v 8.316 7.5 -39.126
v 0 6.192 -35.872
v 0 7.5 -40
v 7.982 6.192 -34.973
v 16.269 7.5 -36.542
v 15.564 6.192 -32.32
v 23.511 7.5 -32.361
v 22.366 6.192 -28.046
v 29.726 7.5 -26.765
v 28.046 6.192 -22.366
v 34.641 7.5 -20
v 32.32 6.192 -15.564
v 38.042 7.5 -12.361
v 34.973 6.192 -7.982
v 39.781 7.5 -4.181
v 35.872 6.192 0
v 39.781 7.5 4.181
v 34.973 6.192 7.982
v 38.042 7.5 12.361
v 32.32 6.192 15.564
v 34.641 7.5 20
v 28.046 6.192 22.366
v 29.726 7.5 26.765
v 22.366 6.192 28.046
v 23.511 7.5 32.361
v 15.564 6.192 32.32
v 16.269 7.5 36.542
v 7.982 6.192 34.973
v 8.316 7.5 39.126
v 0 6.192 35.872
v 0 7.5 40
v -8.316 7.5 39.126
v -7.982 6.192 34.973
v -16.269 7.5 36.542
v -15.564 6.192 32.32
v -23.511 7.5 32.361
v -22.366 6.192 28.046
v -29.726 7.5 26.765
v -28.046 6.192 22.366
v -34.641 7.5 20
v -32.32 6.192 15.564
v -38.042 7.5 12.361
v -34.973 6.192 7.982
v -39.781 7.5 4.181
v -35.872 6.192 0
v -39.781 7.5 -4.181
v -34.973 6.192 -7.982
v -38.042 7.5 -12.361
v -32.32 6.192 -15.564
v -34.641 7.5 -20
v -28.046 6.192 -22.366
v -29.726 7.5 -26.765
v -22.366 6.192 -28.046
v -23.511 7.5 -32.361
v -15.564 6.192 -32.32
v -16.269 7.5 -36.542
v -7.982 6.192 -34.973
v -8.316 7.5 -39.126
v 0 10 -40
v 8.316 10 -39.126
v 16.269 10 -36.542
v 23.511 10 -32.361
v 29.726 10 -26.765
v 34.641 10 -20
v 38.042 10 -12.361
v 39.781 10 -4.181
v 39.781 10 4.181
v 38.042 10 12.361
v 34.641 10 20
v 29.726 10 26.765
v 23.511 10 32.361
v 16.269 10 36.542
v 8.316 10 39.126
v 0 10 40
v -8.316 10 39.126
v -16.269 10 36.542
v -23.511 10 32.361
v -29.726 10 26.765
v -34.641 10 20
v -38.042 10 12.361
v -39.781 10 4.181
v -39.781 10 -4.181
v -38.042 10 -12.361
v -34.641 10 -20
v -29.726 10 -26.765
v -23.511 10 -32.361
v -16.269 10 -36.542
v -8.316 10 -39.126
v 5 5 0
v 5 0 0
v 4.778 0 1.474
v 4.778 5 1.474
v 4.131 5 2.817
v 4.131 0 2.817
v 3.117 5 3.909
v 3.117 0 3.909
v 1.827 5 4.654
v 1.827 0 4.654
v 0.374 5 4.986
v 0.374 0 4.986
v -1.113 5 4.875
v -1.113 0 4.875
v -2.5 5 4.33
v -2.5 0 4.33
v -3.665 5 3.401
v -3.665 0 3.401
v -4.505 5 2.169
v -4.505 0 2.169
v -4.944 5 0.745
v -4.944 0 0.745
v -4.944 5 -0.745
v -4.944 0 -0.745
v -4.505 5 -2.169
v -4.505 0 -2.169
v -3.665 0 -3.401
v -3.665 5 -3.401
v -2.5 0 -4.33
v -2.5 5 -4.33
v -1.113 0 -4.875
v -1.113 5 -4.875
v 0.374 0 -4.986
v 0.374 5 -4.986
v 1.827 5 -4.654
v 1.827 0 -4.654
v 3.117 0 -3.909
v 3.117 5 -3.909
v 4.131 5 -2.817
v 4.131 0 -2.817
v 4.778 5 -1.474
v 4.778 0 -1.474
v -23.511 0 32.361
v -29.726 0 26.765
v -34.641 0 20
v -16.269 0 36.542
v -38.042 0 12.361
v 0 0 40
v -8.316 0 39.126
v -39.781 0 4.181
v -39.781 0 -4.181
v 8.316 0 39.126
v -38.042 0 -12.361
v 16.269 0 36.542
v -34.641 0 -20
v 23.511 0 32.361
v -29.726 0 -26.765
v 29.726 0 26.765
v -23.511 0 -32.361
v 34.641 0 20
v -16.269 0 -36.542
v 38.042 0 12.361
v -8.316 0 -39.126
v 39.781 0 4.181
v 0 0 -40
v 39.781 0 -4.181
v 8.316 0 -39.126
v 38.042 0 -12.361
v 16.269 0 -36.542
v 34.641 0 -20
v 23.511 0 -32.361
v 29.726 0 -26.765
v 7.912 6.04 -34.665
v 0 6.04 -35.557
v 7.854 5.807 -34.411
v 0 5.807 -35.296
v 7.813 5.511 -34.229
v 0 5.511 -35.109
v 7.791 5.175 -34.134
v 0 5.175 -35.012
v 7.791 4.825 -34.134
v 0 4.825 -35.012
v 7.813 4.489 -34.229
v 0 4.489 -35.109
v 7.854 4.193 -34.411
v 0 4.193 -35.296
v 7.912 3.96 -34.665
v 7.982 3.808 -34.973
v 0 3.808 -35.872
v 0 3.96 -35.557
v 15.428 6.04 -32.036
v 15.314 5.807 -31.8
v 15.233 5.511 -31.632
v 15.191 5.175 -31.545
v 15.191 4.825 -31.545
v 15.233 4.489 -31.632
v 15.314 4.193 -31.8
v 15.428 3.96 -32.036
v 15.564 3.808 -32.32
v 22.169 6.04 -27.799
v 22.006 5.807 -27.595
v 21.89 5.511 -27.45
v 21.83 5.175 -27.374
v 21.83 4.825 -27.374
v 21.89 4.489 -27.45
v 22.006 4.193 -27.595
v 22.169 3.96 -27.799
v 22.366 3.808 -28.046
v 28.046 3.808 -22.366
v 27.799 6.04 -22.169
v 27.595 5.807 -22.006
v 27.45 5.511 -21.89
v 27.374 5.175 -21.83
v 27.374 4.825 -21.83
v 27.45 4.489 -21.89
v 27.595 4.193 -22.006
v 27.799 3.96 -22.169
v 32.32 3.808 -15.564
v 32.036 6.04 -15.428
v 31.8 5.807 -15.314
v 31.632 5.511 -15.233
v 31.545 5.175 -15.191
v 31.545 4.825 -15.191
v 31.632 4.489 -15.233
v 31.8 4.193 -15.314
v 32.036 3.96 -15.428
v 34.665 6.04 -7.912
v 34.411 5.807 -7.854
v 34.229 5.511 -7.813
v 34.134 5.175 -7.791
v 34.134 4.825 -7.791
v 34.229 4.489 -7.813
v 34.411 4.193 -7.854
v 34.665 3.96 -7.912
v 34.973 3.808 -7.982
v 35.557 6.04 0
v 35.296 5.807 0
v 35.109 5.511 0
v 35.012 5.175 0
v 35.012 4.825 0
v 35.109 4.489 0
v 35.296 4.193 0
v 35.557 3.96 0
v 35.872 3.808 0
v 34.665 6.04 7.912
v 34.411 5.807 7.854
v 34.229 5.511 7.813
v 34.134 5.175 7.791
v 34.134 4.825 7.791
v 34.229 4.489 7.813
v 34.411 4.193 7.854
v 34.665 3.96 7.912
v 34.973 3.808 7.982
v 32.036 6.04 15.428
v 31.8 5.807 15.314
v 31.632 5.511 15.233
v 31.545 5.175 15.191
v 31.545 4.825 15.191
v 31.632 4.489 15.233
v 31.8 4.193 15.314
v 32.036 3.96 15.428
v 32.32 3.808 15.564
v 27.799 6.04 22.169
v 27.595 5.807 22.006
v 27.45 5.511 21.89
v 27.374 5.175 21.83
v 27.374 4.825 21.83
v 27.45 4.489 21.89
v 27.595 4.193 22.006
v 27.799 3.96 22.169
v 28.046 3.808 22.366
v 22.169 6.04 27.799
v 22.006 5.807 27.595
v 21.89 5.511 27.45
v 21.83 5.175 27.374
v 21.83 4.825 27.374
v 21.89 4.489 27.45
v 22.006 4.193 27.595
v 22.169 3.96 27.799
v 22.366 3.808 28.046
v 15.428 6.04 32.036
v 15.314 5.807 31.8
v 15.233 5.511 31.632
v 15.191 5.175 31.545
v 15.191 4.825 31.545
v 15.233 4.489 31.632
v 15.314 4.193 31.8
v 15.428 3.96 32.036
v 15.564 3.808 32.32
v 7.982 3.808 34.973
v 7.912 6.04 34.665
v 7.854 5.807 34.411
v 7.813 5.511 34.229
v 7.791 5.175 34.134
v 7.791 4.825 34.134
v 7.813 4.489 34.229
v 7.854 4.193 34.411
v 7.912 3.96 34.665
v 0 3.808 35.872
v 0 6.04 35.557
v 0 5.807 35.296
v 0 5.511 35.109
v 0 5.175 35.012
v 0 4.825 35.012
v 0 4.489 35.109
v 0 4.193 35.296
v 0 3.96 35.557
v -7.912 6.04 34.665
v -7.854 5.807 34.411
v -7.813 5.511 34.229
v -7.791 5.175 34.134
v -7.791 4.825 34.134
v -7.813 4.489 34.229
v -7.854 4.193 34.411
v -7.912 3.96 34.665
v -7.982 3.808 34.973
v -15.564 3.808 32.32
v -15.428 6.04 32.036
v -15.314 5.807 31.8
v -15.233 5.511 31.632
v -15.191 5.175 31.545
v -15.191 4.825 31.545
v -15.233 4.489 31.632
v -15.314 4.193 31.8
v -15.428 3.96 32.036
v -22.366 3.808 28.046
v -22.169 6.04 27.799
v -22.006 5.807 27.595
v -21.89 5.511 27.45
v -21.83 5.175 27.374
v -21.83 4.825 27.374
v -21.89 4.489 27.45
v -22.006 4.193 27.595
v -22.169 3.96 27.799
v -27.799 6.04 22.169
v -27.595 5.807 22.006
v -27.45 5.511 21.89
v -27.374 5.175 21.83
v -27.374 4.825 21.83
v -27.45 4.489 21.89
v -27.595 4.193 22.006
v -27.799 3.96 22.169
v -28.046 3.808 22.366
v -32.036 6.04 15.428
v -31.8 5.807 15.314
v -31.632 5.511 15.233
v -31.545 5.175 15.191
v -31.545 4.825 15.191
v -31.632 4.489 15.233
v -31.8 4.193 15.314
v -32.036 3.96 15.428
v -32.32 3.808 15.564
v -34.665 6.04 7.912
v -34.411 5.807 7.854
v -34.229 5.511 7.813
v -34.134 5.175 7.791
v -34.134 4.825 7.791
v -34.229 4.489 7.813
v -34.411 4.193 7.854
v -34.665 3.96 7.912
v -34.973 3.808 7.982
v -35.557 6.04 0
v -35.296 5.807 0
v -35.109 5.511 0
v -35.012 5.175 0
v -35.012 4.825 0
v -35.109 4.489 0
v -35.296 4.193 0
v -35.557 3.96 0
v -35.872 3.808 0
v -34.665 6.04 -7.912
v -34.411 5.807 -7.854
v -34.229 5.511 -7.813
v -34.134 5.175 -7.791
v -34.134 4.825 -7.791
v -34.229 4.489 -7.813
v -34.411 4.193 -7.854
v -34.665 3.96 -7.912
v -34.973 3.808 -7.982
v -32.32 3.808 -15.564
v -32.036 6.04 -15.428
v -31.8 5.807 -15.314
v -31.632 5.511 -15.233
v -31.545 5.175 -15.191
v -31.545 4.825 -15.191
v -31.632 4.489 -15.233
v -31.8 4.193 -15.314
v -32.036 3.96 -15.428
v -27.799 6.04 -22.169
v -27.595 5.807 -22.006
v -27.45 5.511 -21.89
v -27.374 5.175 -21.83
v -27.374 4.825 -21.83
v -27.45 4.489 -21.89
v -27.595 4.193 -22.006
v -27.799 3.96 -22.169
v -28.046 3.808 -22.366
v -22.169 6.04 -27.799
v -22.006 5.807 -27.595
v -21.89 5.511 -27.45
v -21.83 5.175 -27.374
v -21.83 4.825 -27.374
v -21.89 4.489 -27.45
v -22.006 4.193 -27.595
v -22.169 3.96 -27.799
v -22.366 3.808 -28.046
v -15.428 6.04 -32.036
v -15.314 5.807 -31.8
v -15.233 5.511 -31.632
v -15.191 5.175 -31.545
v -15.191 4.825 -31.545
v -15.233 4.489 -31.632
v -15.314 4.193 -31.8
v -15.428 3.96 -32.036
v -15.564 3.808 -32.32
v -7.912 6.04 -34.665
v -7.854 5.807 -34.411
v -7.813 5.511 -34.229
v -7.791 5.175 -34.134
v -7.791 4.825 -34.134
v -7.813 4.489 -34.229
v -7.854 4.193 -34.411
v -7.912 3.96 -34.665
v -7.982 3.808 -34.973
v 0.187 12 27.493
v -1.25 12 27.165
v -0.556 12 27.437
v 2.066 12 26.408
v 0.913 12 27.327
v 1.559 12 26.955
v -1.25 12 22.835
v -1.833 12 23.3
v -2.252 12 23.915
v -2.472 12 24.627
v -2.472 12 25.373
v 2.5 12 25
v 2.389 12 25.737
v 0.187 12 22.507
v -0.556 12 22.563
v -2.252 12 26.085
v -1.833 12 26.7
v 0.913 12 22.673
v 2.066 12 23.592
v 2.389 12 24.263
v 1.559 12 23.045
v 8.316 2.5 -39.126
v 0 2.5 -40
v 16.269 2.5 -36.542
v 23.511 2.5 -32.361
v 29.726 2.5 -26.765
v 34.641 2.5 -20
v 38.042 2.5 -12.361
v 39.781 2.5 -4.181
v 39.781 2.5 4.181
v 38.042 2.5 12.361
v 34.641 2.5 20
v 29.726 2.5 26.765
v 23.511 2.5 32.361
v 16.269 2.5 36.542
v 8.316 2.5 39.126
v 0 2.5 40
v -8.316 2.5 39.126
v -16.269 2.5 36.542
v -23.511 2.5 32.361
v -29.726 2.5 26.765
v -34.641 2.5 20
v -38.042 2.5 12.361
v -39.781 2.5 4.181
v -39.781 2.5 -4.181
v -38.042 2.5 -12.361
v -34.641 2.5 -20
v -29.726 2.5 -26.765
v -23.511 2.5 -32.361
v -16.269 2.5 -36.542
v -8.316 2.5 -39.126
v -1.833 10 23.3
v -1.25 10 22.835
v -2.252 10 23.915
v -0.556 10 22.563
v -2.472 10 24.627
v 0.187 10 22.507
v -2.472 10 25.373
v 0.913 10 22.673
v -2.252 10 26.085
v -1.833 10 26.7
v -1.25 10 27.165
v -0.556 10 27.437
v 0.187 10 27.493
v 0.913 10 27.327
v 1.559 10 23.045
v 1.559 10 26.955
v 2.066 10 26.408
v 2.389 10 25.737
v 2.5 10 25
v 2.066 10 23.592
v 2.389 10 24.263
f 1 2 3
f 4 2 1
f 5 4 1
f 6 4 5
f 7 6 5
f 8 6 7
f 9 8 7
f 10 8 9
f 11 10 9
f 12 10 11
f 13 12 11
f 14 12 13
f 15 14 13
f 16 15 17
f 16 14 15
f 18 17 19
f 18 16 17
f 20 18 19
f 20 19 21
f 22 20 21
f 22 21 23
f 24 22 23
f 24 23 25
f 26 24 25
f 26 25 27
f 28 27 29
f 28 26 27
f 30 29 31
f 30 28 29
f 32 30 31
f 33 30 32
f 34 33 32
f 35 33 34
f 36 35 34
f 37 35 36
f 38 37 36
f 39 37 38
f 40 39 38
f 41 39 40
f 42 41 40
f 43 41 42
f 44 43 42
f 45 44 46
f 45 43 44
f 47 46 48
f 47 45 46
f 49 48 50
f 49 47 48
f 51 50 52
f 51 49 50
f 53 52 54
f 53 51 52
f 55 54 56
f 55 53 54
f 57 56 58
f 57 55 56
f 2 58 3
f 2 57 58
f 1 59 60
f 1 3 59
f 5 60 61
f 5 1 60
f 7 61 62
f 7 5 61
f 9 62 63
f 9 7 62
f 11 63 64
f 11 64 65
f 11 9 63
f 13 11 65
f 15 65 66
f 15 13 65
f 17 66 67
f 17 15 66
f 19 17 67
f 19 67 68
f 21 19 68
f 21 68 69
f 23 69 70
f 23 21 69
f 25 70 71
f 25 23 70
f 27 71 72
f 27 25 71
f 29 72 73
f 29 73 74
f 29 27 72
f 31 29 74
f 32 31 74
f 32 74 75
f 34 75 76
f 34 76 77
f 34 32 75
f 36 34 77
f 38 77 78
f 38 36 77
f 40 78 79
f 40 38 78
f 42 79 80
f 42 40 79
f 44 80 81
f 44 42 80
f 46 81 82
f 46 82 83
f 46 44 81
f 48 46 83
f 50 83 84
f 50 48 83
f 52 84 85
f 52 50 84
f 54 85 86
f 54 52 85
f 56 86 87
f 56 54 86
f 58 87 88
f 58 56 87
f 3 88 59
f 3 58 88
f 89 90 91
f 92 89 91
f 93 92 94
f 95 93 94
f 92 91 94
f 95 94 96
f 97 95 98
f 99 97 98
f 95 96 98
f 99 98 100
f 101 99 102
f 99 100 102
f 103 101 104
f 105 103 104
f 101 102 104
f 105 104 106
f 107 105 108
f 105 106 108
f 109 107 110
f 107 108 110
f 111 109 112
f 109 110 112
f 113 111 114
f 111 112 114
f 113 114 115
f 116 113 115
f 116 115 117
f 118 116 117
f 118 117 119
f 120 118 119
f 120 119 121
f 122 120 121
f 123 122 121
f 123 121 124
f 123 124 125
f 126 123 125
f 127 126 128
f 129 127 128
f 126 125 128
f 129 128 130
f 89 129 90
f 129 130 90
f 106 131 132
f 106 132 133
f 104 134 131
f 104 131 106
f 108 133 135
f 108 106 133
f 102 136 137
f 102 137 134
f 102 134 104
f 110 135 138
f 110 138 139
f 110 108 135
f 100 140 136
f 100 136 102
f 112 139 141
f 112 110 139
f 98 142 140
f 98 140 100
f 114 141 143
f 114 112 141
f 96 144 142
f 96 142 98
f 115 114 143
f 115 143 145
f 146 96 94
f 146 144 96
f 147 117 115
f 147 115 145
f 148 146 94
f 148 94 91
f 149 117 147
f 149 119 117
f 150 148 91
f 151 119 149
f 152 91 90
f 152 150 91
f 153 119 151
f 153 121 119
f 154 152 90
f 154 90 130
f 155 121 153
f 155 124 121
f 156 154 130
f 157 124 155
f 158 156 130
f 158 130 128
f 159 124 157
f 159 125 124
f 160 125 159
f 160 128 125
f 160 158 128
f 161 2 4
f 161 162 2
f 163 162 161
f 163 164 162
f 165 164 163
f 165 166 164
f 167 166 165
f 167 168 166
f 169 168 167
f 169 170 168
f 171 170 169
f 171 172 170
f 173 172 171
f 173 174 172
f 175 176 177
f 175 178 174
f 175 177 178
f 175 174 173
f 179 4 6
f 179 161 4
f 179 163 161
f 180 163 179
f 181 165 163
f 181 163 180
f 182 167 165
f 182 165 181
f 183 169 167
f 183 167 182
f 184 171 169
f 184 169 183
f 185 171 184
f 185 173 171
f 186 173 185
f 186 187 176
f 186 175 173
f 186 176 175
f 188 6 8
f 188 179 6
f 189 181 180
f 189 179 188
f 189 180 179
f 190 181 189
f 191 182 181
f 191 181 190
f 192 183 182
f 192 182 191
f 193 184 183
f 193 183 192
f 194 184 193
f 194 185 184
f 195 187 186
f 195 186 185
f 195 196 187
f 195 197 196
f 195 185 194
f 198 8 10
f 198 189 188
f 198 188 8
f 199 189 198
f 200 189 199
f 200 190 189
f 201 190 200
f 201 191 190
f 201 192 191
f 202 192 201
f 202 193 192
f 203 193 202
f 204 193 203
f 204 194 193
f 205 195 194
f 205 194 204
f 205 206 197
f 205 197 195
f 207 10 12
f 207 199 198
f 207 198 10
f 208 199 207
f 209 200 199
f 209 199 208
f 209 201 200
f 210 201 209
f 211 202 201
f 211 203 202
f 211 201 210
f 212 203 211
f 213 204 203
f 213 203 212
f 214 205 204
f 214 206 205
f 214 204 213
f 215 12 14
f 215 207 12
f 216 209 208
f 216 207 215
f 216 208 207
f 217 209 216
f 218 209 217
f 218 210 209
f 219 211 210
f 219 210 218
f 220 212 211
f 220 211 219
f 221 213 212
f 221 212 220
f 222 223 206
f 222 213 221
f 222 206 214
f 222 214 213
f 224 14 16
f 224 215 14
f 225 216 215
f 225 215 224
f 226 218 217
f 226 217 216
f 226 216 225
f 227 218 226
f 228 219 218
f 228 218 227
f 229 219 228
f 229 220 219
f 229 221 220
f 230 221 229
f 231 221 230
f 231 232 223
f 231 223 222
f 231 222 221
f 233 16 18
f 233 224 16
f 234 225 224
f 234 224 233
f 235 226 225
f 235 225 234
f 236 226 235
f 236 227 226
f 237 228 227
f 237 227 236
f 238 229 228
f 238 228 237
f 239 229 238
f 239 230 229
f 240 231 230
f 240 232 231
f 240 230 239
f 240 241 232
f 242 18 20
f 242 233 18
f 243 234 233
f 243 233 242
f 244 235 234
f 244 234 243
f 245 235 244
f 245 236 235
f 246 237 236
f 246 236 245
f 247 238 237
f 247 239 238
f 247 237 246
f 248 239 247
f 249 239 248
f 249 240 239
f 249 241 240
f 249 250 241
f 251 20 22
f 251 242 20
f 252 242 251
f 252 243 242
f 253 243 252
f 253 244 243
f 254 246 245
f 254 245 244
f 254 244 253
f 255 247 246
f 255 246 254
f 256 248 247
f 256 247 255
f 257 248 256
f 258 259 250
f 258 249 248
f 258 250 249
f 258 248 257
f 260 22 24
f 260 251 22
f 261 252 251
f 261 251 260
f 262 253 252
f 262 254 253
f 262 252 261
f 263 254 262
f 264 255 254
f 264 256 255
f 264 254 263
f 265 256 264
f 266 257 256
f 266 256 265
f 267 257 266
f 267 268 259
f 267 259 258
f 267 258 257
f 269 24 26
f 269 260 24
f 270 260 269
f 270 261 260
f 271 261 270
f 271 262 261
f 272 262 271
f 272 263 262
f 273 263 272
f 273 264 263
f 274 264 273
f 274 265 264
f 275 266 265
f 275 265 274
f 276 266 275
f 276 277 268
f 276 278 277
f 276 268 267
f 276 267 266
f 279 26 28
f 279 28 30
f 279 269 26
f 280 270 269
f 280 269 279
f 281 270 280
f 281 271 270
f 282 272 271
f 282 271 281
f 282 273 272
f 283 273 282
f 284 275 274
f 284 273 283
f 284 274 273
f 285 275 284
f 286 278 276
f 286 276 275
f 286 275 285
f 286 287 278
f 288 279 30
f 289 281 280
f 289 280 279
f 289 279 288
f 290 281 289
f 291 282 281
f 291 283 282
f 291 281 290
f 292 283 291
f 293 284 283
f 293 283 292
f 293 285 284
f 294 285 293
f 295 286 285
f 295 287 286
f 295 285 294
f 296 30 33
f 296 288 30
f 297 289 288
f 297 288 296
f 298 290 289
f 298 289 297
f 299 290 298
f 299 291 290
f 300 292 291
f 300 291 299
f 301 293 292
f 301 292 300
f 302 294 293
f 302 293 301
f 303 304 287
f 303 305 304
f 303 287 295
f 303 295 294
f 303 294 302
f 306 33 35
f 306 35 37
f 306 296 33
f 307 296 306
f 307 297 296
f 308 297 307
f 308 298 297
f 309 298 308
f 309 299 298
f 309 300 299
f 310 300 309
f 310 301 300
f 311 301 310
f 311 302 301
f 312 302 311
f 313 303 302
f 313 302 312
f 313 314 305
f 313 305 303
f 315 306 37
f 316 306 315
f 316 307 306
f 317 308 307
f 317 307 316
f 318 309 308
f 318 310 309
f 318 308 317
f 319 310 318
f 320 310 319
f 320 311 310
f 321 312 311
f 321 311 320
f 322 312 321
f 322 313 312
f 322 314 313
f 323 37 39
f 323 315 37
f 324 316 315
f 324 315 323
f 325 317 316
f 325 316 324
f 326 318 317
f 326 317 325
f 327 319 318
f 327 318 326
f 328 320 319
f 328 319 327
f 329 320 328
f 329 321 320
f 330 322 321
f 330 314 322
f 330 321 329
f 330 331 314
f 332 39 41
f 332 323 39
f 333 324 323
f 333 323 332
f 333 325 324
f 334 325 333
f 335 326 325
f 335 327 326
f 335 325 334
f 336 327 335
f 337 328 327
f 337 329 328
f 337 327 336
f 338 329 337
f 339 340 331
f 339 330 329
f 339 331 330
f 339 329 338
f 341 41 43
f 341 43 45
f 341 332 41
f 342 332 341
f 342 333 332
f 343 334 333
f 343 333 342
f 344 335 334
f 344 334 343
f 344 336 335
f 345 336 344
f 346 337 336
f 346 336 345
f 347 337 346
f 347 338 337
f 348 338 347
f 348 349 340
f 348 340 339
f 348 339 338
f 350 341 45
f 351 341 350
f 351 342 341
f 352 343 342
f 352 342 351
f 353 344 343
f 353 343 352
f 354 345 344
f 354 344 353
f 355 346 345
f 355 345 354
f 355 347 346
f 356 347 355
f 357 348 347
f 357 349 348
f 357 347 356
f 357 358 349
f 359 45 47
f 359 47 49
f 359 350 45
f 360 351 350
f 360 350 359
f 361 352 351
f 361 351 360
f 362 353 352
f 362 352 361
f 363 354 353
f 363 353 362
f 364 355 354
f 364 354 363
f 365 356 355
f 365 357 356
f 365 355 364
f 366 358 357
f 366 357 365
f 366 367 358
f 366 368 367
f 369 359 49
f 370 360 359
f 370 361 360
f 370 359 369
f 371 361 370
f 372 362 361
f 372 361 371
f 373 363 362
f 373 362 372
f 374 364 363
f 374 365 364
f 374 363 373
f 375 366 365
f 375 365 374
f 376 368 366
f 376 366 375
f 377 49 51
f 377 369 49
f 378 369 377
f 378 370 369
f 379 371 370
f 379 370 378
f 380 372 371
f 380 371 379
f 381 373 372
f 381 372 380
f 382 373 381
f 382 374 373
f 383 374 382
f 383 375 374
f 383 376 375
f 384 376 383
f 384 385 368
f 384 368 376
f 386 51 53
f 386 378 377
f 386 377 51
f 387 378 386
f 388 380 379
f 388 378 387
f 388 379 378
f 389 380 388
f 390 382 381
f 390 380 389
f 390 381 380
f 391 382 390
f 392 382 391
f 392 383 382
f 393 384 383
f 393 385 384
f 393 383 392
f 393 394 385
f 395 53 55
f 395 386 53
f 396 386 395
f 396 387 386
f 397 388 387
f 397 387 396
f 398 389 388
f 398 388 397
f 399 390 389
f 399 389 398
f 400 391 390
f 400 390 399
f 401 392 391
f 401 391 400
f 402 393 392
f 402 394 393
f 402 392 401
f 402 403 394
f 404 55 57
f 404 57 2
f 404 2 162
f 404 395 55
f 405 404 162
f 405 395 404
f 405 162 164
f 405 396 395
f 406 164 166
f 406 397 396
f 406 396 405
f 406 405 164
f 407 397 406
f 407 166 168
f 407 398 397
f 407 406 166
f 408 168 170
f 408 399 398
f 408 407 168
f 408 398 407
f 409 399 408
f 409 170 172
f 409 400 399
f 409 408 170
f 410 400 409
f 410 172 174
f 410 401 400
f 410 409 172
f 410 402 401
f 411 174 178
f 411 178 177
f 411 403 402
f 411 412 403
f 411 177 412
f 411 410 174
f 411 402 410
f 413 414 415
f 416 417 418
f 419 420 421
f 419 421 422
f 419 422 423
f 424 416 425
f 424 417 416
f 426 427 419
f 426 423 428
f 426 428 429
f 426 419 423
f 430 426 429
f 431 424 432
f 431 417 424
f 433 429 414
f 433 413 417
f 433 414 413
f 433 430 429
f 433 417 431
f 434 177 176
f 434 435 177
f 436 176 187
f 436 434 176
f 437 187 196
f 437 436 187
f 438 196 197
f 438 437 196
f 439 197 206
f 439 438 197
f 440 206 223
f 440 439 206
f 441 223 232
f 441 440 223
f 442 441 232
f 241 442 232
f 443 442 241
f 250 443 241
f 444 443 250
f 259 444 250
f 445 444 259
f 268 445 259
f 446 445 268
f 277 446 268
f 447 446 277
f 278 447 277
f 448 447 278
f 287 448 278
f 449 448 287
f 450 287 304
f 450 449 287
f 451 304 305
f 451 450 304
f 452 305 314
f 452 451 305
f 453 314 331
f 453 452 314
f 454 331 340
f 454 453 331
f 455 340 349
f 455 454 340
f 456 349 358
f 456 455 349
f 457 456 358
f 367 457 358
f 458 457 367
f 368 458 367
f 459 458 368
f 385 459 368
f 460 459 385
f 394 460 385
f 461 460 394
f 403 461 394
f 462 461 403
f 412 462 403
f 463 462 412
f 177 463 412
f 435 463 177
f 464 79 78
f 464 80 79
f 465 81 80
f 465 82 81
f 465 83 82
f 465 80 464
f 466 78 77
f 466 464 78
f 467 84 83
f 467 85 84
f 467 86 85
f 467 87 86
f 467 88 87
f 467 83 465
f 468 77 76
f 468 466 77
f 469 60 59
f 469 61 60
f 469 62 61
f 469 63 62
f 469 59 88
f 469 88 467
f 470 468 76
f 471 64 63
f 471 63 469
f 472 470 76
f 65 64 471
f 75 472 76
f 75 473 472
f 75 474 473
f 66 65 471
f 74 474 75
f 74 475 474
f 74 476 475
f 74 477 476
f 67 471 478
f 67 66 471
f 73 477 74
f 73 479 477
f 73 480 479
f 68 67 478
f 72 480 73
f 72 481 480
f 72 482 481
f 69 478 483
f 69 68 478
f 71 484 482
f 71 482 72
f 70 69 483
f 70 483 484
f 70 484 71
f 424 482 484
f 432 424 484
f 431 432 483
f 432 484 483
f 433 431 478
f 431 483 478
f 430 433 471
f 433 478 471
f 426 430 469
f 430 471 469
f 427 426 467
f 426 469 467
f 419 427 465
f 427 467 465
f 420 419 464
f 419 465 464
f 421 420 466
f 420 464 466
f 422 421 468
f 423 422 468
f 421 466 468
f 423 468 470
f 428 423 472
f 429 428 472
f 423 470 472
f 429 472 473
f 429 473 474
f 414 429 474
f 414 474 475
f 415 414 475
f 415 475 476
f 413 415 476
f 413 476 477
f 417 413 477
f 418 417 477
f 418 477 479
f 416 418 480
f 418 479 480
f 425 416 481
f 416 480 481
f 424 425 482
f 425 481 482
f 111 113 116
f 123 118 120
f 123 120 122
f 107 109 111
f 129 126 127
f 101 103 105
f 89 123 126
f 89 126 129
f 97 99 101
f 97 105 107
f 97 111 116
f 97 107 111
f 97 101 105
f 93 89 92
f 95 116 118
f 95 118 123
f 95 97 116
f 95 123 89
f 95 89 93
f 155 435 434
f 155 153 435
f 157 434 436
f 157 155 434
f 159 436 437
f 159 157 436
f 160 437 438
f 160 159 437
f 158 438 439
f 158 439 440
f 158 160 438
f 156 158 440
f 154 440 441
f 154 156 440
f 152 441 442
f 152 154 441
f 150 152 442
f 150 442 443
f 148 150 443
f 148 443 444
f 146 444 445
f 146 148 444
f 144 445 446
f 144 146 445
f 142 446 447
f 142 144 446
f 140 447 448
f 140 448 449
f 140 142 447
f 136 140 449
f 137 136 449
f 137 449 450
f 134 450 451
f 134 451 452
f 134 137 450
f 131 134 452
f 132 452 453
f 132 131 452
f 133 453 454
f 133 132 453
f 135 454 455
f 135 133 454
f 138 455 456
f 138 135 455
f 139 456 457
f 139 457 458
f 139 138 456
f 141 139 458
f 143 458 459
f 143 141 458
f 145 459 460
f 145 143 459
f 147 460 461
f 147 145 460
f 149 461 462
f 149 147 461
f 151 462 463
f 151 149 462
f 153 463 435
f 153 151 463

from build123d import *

# Parameters (mm, degrees)
SKETCH1_R           = 35
BOSS_EXTRUDE1_DEPTH = 10
SKETCH3_R           = 5
CUT_EXTRUDE1_DEPTH  = 5
SKETCH4_R           = 2.5
BOSS_EXTRUDE2_DEPTH = 2


with BuildPart() as part:
    # Sketch1 → Boss-Extrude1 (new body)
    with BuildSketch(Plane(origin=(0, 0, 0), x_dir=(1, 0, 0), z_dir=(0, 1, 0))):
        Circle(SKETCH1_R)
    extrude(amount=BOSS_EXTRUDE1_DEPTH)

    # Sketch2 → Revolve1 (revolve)
    with BuildSketch(Plane(origin=(0, 0, 0), x_dir=(0, 0, -1), z_dir=(1, 0, 0))):
        with BuildLine():
            Line((35, 10), (40, 10))
            Line((40, 10), (40, 7.5))
            Line((40, 7.5), (35.872288151, 6.191567774))
            ThreePointArc((35.872288151, 6.191567774), (35, 5), (35.872288151, 3.808432226))
            Line((35.872288151, 3.808432226), (40, 2.5))
            Line((40, 2.5), (40, 0))
            Line((40, 0), (35, 0))
            Line((35, 0), (34, 0))
            Line((34, 0), (34, 10))
            Line((34, 10), (35, 10))
        make_face()
    revolve(axis=Axis((0, 10, 0), (0, -1, 0)))

    # Sketch3 → Cut-Extrude1 (cut)
    with BuildSketch(Plane.XZ):
        Circle(SKETCH3_R)
    extrude(amount=-CUT_EXTRUDE1_DEPTH, mode=Mode.SUBTRACT)

    # Sketch4 → Boss-Extrude2 (add)
    with BuildSketch(Plane(origin=(0, 10, 0), x_dir=(1, 0, 0), z_dir=(0, 1, 0))):
        with Locations((0, -25)):
            Circle(SKETCH4_R)
    extrude(amount=BOSS_EXTRUDE2_DEPTH)


solid = part.part
